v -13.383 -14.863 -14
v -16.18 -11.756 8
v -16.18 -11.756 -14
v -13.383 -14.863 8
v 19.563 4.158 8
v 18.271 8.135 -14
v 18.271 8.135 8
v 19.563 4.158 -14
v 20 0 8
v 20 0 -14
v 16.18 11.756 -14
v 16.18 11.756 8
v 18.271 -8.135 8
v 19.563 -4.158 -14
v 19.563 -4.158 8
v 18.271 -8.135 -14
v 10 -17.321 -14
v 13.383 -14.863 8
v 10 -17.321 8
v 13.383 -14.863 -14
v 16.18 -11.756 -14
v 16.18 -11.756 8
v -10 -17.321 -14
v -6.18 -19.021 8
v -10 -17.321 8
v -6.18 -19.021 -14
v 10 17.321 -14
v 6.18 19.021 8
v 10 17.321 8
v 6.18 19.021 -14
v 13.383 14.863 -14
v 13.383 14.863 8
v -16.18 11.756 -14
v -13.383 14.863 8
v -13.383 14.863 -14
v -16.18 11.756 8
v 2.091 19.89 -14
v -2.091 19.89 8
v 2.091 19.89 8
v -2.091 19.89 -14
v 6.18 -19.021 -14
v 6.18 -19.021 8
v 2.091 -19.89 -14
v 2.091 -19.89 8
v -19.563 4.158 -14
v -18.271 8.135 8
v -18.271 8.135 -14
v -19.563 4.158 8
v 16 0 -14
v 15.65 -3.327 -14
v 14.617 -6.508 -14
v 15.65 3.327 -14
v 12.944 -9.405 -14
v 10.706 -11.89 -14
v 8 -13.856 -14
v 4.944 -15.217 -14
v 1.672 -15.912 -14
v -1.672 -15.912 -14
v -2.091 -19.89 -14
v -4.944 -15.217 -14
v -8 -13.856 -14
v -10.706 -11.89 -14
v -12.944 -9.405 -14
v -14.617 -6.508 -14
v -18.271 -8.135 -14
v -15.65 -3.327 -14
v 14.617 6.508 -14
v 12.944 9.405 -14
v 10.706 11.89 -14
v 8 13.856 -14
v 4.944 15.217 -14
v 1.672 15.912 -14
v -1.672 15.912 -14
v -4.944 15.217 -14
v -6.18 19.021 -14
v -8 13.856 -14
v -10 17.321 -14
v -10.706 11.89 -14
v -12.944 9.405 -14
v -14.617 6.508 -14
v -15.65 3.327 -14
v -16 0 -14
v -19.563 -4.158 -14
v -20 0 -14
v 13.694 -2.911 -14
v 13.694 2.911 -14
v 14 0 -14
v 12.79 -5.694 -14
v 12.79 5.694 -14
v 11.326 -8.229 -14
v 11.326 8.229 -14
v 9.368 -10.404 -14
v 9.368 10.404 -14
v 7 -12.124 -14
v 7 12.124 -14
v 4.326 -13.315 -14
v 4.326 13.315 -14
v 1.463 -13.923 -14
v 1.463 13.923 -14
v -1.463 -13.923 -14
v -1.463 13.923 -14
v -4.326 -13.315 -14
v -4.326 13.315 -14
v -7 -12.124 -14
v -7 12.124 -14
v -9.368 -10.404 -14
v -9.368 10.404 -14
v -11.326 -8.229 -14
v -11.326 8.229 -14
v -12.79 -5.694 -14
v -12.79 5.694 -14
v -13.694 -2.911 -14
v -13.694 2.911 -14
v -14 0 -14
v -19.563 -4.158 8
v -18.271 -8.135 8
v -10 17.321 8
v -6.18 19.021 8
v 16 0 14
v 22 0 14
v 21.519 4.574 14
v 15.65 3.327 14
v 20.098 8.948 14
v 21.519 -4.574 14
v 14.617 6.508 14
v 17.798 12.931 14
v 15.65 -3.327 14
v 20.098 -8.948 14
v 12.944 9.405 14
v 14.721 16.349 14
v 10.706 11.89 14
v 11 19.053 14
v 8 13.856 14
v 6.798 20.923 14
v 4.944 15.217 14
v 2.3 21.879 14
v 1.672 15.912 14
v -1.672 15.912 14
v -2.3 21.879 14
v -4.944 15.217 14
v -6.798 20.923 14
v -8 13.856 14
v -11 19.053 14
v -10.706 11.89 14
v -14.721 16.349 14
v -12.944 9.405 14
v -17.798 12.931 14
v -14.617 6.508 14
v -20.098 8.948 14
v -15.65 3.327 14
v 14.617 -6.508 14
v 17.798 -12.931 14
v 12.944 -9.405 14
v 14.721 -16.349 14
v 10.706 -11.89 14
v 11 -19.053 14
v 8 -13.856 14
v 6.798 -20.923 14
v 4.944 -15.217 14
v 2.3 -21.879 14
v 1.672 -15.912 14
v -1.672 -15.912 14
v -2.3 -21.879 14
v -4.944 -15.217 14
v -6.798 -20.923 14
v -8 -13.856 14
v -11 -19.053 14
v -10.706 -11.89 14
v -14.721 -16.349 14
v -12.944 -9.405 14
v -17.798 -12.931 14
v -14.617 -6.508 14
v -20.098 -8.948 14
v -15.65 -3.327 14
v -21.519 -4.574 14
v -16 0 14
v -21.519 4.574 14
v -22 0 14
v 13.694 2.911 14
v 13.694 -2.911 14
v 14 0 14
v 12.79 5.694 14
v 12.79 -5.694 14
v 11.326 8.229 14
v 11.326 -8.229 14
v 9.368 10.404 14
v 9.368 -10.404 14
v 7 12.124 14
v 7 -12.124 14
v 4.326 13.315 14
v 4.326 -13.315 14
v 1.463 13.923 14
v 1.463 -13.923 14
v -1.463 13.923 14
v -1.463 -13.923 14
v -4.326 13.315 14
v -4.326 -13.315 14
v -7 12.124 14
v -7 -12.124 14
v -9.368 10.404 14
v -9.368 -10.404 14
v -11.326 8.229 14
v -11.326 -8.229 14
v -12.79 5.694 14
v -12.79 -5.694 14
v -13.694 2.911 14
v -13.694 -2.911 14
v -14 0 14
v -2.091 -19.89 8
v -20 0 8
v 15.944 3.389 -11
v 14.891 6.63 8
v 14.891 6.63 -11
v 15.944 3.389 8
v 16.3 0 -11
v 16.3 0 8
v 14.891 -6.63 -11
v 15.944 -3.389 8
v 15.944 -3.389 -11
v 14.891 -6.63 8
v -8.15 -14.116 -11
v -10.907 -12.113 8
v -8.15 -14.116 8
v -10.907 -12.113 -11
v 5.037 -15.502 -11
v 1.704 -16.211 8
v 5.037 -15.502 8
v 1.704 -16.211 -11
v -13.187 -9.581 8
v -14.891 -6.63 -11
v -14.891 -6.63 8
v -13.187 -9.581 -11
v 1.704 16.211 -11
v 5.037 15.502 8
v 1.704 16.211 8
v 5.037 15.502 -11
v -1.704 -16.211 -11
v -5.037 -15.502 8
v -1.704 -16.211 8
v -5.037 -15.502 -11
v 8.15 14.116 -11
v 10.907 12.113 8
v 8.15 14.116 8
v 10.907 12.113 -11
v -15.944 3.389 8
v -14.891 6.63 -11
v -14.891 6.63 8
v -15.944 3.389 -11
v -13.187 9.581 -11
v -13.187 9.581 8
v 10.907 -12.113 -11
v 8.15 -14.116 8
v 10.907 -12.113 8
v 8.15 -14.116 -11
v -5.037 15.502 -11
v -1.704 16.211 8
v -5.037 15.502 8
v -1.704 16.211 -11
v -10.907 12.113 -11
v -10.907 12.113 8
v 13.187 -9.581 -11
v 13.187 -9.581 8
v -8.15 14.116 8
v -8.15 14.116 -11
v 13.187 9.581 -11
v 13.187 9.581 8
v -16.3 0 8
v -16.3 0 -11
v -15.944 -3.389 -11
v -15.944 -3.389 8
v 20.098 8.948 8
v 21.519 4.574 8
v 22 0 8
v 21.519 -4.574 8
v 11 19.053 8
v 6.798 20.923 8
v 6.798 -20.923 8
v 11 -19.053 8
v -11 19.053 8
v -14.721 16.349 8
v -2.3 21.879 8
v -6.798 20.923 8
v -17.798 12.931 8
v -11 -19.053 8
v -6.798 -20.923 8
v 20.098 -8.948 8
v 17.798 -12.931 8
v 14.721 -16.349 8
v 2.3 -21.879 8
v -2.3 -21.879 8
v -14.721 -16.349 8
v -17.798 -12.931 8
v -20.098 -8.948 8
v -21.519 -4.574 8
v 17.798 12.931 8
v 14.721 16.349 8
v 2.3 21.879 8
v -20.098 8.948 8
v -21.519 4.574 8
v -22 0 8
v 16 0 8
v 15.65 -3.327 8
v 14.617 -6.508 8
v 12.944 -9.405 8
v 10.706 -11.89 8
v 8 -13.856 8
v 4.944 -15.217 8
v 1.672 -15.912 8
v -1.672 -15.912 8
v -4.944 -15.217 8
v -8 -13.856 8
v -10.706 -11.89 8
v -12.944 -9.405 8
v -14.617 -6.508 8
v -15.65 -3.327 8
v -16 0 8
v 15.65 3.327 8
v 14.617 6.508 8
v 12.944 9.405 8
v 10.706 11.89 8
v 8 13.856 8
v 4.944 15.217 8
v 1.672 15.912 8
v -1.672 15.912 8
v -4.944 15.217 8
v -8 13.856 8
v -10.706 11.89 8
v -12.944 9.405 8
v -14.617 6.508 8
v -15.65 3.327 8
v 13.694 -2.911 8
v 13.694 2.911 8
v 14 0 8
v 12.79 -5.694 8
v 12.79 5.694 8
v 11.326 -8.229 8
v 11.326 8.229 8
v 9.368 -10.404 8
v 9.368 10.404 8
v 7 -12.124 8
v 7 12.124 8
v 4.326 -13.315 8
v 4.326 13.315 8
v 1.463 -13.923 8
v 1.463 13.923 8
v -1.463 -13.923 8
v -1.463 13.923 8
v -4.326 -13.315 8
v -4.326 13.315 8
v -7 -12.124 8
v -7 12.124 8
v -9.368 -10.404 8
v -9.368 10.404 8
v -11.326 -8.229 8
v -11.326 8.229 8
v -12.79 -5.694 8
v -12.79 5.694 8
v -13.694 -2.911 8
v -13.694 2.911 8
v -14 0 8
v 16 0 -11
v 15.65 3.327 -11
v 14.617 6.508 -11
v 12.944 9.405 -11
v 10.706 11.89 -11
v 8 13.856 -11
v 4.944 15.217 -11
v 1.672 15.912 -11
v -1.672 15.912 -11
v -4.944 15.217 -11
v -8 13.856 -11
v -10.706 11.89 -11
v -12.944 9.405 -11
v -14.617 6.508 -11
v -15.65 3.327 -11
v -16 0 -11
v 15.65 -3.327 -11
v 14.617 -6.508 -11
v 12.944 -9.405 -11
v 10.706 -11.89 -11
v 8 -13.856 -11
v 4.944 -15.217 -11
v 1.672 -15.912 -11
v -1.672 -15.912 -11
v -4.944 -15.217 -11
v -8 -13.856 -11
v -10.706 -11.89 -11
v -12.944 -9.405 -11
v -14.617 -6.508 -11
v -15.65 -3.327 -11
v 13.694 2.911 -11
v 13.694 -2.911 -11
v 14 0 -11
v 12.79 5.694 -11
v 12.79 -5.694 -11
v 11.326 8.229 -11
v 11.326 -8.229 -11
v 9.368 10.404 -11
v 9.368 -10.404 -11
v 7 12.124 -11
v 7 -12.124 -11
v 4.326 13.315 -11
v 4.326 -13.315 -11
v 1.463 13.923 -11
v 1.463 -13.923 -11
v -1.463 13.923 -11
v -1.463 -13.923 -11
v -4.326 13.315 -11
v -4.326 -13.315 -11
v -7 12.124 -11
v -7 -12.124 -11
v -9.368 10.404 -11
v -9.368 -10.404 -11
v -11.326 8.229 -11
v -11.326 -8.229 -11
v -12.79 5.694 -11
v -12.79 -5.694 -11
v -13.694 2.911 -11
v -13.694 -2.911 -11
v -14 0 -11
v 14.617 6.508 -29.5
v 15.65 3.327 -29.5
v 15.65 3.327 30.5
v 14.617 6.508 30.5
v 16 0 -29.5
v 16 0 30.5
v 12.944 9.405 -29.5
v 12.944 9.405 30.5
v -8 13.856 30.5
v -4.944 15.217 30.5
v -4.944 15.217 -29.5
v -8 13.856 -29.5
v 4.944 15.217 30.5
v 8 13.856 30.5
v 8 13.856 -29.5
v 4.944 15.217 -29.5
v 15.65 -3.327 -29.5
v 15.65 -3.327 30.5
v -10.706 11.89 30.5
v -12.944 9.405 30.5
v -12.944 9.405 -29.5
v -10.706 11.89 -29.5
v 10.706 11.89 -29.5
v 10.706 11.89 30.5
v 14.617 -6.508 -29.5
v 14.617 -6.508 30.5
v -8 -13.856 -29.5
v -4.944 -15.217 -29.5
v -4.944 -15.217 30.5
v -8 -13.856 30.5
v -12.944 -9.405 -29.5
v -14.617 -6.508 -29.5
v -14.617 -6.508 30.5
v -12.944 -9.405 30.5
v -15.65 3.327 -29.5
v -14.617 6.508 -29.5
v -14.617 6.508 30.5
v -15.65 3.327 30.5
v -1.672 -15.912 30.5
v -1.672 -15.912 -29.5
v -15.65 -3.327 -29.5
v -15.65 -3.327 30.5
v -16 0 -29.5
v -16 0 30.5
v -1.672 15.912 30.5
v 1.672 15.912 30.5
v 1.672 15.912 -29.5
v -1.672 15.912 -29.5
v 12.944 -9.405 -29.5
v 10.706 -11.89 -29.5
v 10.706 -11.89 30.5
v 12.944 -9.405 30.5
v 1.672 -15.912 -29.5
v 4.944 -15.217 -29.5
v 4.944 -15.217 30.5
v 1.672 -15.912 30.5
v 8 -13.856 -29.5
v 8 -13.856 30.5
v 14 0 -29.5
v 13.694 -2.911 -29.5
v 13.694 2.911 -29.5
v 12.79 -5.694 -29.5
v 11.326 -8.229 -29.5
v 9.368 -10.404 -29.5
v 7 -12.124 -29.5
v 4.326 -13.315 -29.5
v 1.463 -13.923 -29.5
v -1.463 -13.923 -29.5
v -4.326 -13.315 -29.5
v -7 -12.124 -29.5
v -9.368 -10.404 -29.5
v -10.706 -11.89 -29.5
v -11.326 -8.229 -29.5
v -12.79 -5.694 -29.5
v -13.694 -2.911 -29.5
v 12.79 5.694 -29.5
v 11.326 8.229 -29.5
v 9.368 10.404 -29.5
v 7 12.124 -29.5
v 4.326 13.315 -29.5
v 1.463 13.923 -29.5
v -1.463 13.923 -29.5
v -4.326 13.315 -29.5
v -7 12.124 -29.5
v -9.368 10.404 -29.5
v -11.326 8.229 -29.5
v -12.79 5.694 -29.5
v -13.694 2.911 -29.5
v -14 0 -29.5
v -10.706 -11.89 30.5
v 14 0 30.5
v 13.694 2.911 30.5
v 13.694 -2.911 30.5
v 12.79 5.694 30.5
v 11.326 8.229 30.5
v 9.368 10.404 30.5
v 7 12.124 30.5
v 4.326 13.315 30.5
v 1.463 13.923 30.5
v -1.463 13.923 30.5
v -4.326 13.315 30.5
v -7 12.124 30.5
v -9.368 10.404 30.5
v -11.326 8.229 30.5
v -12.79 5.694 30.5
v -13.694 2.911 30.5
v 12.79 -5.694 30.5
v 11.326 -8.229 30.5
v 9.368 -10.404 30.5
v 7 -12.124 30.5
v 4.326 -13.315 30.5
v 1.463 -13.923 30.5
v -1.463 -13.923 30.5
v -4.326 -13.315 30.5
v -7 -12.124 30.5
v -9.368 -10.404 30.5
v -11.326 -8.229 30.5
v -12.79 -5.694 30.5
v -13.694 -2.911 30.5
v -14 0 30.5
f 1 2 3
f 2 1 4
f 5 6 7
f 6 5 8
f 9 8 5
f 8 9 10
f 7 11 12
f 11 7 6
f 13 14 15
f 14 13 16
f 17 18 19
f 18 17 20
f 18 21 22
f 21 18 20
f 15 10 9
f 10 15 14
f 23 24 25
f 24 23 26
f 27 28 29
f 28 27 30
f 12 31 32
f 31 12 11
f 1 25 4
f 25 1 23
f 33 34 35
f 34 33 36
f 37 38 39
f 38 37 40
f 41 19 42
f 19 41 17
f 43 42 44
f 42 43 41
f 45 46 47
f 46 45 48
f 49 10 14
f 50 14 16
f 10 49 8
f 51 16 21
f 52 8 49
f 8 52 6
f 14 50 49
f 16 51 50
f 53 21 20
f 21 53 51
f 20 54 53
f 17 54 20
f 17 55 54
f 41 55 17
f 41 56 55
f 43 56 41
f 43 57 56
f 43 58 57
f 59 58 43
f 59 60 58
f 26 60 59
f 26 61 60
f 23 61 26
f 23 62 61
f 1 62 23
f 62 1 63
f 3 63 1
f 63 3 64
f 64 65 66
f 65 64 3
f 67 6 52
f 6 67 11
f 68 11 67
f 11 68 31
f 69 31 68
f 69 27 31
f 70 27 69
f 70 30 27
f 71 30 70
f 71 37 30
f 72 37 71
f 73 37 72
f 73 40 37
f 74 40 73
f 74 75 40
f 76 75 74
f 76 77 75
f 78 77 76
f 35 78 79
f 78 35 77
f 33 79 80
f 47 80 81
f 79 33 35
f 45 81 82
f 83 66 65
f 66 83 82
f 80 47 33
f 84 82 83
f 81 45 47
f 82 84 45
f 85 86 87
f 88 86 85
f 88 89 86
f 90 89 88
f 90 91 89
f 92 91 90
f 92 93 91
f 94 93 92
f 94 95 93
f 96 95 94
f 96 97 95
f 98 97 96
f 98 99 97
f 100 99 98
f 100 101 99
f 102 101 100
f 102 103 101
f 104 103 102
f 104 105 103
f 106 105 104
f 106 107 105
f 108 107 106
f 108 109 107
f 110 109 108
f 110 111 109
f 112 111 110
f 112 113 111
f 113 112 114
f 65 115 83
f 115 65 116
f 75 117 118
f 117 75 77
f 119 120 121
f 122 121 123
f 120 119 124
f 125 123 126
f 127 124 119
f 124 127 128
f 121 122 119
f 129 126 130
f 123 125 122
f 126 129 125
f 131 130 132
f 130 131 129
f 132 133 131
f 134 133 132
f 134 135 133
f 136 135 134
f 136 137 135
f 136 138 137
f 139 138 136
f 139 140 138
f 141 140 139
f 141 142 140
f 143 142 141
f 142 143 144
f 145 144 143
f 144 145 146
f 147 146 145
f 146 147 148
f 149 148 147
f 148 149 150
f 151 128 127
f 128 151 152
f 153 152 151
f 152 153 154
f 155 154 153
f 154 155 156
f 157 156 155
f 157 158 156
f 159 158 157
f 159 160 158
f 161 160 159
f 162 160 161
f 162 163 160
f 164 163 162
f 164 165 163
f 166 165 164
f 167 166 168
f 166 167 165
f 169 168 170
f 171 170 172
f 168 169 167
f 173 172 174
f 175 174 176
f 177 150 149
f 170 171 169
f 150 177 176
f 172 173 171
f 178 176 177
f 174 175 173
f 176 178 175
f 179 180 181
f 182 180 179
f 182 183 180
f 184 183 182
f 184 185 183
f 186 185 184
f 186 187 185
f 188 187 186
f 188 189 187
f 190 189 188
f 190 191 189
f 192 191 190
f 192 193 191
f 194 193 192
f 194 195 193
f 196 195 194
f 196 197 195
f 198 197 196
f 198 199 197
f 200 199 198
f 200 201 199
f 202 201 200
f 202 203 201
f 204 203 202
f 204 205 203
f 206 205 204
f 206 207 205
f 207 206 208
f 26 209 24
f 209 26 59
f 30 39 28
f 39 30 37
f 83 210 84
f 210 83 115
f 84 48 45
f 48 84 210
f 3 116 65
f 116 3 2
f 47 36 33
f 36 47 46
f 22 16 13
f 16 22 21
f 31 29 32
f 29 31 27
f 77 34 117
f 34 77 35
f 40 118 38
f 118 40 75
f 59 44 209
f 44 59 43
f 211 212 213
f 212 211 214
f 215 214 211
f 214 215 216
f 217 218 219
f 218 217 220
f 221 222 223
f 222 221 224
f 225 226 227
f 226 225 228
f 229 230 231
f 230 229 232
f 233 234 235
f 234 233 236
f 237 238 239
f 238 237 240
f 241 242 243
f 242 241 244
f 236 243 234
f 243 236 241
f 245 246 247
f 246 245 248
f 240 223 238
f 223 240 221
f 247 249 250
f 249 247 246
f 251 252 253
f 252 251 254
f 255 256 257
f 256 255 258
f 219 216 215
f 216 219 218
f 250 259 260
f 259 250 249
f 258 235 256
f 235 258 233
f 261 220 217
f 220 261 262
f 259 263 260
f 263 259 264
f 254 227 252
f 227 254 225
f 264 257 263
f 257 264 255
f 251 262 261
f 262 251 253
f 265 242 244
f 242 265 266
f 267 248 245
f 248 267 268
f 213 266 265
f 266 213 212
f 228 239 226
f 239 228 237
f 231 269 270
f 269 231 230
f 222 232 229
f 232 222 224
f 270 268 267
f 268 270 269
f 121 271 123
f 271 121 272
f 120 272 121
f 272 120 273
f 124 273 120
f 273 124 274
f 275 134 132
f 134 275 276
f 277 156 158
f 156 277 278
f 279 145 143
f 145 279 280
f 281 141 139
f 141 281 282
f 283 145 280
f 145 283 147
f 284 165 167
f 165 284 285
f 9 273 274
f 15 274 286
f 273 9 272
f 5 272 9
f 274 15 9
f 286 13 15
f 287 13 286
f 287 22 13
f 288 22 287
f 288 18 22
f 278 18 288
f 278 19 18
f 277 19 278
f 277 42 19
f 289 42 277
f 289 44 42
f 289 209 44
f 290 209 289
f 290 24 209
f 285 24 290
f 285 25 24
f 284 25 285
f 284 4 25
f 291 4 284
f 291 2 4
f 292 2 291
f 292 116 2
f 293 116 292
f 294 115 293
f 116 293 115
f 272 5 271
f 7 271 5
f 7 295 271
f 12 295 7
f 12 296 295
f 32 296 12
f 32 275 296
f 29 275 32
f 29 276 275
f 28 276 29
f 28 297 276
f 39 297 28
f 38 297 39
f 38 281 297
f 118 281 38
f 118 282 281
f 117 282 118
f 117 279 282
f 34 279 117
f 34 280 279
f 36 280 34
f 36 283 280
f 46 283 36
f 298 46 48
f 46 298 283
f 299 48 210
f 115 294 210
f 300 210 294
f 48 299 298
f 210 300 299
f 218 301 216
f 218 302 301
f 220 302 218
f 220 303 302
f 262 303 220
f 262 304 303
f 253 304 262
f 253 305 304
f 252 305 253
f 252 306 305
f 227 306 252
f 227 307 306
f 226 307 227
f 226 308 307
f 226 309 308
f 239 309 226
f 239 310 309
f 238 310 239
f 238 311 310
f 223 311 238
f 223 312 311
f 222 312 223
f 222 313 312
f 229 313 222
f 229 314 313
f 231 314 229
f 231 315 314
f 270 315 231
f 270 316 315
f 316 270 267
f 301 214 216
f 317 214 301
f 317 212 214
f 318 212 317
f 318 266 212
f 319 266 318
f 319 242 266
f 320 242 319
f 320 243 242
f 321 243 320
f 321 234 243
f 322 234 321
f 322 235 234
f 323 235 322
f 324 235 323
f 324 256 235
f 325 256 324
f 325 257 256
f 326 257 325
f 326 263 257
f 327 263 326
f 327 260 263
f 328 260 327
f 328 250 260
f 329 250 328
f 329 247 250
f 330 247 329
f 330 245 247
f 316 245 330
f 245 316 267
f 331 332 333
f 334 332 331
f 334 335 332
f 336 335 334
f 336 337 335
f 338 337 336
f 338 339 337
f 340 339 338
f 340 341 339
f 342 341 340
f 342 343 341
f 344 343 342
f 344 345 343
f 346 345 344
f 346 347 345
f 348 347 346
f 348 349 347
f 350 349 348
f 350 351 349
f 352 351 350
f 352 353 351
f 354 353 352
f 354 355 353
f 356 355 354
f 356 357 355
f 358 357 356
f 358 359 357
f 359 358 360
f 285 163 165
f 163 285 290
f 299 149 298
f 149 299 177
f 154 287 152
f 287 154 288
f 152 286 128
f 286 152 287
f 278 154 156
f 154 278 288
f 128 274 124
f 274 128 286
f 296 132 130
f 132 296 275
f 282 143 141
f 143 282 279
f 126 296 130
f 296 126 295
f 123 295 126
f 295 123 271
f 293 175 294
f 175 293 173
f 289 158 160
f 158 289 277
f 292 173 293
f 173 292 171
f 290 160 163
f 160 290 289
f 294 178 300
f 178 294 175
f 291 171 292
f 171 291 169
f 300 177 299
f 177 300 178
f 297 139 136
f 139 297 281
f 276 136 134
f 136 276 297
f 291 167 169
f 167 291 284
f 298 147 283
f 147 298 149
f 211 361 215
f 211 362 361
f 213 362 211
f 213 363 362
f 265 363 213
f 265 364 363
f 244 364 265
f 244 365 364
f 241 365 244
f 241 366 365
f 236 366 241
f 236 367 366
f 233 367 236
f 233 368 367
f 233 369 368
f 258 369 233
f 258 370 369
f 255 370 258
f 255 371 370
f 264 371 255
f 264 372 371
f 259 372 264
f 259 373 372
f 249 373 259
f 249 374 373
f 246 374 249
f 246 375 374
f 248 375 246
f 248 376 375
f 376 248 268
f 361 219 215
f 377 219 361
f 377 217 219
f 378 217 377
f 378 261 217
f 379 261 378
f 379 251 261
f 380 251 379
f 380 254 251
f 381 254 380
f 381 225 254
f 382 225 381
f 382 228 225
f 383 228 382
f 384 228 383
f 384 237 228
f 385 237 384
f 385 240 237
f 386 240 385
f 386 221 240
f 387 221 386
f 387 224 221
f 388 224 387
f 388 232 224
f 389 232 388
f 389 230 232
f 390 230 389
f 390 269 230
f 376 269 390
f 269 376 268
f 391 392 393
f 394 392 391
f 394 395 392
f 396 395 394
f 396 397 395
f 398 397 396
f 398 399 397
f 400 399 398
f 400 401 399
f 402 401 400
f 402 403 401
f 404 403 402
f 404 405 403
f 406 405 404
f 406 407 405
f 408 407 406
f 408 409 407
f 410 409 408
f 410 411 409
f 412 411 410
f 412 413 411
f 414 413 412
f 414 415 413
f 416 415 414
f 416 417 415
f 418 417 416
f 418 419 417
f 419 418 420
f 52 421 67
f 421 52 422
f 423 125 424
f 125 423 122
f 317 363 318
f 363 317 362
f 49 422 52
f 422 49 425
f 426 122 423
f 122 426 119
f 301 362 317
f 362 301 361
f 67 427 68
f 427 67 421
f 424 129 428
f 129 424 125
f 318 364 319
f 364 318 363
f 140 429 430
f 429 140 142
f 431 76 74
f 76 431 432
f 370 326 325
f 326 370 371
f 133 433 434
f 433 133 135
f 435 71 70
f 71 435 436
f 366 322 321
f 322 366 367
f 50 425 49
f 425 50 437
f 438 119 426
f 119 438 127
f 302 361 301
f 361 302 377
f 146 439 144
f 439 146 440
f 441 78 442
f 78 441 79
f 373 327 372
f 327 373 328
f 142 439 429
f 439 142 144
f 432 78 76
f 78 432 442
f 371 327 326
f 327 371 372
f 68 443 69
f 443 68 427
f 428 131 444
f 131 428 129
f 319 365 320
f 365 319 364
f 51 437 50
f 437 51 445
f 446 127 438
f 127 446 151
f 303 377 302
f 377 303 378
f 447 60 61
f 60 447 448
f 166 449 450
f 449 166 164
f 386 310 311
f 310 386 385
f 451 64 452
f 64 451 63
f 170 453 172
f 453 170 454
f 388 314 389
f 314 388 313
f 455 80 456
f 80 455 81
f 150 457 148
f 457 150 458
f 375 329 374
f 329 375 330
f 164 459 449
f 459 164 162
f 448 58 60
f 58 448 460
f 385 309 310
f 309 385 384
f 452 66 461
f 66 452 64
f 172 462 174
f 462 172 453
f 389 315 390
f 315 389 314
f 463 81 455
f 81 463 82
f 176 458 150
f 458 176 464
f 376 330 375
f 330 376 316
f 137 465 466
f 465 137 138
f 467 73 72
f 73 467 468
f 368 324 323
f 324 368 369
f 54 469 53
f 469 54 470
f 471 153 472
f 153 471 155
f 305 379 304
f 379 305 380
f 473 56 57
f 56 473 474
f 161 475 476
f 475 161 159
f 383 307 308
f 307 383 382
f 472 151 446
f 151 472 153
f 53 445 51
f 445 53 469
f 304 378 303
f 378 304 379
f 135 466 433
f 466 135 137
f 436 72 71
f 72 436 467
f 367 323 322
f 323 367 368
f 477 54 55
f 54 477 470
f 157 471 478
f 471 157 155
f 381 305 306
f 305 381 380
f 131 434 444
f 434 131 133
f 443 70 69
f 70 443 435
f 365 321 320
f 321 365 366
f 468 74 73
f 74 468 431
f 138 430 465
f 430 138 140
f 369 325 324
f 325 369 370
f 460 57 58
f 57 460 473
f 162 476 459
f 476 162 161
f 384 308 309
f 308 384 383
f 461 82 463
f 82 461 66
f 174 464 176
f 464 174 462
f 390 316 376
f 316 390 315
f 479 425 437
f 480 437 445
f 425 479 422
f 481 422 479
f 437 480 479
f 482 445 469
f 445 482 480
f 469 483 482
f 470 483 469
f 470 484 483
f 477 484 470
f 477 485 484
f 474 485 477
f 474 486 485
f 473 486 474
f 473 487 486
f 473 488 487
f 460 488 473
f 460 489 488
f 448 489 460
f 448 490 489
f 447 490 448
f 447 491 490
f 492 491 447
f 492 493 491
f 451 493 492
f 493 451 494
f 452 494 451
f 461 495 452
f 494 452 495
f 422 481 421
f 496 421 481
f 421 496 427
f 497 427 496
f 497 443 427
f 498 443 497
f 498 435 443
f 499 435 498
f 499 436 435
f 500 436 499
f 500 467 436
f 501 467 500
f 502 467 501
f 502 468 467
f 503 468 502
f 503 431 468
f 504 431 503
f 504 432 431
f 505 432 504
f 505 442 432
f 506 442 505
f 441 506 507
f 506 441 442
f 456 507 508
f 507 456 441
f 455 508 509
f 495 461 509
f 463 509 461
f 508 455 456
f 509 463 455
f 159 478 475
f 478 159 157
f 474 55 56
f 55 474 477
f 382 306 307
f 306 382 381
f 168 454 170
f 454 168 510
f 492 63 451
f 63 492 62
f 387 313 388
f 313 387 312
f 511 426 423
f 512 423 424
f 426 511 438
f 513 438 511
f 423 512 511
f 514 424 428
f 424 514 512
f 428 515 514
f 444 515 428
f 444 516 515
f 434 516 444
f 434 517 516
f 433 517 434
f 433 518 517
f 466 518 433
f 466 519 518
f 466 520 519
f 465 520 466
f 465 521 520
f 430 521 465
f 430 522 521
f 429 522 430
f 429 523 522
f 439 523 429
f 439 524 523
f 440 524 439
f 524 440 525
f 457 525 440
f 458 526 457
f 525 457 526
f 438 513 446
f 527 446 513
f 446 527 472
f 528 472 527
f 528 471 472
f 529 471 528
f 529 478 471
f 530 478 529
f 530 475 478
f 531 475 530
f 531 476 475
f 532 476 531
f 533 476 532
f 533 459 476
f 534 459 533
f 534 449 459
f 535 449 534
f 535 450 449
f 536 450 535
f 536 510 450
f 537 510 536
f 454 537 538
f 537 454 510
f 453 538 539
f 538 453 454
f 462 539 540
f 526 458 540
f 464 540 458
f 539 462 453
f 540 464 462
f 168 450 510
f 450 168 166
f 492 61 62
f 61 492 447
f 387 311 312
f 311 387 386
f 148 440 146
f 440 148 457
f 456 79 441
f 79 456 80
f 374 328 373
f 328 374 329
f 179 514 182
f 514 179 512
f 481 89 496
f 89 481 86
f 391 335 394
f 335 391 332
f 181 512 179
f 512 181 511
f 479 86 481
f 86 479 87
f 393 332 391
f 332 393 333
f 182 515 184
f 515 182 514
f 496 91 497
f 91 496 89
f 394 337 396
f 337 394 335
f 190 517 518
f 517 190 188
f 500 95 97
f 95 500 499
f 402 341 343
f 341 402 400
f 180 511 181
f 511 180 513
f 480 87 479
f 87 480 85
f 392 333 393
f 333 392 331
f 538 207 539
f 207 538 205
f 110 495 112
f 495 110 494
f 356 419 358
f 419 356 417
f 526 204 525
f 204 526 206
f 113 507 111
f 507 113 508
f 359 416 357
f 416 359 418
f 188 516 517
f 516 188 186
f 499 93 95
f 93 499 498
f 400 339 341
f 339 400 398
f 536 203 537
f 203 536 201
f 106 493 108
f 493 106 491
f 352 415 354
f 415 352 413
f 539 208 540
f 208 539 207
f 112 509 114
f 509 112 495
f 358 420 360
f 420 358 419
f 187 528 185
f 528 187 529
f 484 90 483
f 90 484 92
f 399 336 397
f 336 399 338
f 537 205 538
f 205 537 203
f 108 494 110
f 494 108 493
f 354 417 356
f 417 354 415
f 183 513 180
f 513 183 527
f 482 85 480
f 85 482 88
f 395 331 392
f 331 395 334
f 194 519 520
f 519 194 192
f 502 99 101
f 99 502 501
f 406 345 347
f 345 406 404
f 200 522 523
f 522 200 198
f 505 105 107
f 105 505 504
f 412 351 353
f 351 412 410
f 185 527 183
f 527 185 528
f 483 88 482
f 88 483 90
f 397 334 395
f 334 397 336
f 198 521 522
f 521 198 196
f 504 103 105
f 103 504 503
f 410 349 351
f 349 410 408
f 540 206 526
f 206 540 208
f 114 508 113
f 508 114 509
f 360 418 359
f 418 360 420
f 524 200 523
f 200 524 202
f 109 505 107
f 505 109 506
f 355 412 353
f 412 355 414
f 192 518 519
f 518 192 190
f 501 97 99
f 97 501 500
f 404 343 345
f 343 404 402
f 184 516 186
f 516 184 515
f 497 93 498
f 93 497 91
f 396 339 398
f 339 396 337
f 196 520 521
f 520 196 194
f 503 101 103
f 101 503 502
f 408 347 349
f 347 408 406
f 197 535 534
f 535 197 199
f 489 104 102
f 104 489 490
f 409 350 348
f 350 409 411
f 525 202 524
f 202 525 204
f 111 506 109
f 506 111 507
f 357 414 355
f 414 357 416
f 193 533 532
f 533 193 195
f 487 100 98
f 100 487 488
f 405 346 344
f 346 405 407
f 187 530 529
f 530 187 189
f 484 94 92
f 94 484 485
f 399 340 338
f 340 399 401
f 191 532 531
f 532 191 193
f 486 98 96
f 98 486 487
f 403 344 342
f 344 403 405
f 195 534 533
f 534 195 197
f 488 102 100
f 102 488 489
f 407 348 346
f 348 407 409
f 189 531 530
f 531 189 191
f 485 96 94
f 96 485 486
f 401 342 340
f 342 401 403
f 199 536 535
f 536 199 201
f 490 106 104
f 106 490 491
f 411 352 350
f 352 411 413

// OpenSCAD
// Parameters
nominal_diameter_mm = 32; //[16:64:1]
pipe_outer_diameter_mm = 32; //[20:50:0.1]
cap_outer_diameter_mm = 40; //[28:80:0.1]
wall_thickness_mm = 2.5; //[1.2:6:0.1]
insertion_depth_mm = 25; //[12:60:1]
end_thickness_mm = 3; //[1.5:8:0.1]
clearance_mm = 0.3; //[0.1:1:0.05]
chamfer_mm = 1; //[0:3:0.1]
stop_shoulder_thickness_mm = 2; //[1:5:0.1]
grip_rim_radial_mm = 2; //[0:6:0.1]
grip_rim_height_mm = 6; //[2:15:0.5]
pipe_wall_mm = 2.0; //[1.0:4.0:0.1]
pipe_stub_length_mm = 60; //[30:150:1]
overlap_mm = 1; //[0.5:2:0.1]

// HT Pipe - complete geometry
module ht_pipe() {
  color([0.85, 0.85, 0.8]) {
    difference() {
      // Outer pipe
      cylinder(h=pipe_stub_length_mm, r=pipe_outer_diameter_mm/2, center=true);
      // Inner cavity
      translate([0, 0, -overlap_mm/2])
        cylinder(h=pipe_stub_length_mm + overlap_mm, r=pipe_outer_diameter_mm/2 - pipe_wall_mm, center=true);
    }
  }
}

// Cap assembly
module cap_assembly() {
  color([0.85, 0.85, 0.8]) {
    // Cap body
    difference() {
      cylinder(h=end_thickness_mm + insertion_depth_mm, r=cap_outer_diameter_mm/2, center=true);
      // Socket cavity
      translate([0, 0, (end_thickness_mm + insertion_depth_mm)/2 - (insertion_depth_mm + overlap_mm)/2])
        cylinder(h=insertion_depth_mm + overlap_mm, r=pipe_outer_diameter_mm/2 + clearance_mm, center=true);
      // Stop shoulder
      translate([0, 0, -(end_thickness_mm + insertion_depth_mm)/2 + end_thickness_mm + insertion_depth_mm - stop_shoulder_thickness_mm/2])
        cylinder(h=stop_shoulder_thickness_mm, r=pipe_outer_diameter_mm/2 + clearance_mm, center=true);
      // Chamfer cutter
      translate([0, 0, (end_thickness_mm + insertion_depth_mm)/2 - chamfer_mm/2])
        rotate([180, 0, 0])
        cylinder(h=chamfer_mm, r1=pipe_outer_diameter_mm/2 + clearance_mm + chamfer_mm, r2=0, center=true);
    }
    // Outer grip rim
    translate([0, 0, (end_thickness_mm + insertion_depth_mm)/2 - grip_rim_height_mm/2])
      cylinder(h=grip_rim_height_mm, r=cap_outer_diameter_mm/2 + grip_rim_radial_mm, center=true);
    // End face
    translate([0, 0, -(end_thickness_mm + insertion_depth_mm)/2 + end_thickness_mm/2])
      cylinder(h=end_thickness_mm, r=cap_outer_diameter_mm/2, center=true);
  }
}

// Final assembly
module assembly() {
  cap_assembly();
  translate([0, 0, (end_thickness_mm + insertion_depth_mm)/2 - insertion_depth_mm/2 - overlap_mm])
    ht_pipe();
}

assembly();
